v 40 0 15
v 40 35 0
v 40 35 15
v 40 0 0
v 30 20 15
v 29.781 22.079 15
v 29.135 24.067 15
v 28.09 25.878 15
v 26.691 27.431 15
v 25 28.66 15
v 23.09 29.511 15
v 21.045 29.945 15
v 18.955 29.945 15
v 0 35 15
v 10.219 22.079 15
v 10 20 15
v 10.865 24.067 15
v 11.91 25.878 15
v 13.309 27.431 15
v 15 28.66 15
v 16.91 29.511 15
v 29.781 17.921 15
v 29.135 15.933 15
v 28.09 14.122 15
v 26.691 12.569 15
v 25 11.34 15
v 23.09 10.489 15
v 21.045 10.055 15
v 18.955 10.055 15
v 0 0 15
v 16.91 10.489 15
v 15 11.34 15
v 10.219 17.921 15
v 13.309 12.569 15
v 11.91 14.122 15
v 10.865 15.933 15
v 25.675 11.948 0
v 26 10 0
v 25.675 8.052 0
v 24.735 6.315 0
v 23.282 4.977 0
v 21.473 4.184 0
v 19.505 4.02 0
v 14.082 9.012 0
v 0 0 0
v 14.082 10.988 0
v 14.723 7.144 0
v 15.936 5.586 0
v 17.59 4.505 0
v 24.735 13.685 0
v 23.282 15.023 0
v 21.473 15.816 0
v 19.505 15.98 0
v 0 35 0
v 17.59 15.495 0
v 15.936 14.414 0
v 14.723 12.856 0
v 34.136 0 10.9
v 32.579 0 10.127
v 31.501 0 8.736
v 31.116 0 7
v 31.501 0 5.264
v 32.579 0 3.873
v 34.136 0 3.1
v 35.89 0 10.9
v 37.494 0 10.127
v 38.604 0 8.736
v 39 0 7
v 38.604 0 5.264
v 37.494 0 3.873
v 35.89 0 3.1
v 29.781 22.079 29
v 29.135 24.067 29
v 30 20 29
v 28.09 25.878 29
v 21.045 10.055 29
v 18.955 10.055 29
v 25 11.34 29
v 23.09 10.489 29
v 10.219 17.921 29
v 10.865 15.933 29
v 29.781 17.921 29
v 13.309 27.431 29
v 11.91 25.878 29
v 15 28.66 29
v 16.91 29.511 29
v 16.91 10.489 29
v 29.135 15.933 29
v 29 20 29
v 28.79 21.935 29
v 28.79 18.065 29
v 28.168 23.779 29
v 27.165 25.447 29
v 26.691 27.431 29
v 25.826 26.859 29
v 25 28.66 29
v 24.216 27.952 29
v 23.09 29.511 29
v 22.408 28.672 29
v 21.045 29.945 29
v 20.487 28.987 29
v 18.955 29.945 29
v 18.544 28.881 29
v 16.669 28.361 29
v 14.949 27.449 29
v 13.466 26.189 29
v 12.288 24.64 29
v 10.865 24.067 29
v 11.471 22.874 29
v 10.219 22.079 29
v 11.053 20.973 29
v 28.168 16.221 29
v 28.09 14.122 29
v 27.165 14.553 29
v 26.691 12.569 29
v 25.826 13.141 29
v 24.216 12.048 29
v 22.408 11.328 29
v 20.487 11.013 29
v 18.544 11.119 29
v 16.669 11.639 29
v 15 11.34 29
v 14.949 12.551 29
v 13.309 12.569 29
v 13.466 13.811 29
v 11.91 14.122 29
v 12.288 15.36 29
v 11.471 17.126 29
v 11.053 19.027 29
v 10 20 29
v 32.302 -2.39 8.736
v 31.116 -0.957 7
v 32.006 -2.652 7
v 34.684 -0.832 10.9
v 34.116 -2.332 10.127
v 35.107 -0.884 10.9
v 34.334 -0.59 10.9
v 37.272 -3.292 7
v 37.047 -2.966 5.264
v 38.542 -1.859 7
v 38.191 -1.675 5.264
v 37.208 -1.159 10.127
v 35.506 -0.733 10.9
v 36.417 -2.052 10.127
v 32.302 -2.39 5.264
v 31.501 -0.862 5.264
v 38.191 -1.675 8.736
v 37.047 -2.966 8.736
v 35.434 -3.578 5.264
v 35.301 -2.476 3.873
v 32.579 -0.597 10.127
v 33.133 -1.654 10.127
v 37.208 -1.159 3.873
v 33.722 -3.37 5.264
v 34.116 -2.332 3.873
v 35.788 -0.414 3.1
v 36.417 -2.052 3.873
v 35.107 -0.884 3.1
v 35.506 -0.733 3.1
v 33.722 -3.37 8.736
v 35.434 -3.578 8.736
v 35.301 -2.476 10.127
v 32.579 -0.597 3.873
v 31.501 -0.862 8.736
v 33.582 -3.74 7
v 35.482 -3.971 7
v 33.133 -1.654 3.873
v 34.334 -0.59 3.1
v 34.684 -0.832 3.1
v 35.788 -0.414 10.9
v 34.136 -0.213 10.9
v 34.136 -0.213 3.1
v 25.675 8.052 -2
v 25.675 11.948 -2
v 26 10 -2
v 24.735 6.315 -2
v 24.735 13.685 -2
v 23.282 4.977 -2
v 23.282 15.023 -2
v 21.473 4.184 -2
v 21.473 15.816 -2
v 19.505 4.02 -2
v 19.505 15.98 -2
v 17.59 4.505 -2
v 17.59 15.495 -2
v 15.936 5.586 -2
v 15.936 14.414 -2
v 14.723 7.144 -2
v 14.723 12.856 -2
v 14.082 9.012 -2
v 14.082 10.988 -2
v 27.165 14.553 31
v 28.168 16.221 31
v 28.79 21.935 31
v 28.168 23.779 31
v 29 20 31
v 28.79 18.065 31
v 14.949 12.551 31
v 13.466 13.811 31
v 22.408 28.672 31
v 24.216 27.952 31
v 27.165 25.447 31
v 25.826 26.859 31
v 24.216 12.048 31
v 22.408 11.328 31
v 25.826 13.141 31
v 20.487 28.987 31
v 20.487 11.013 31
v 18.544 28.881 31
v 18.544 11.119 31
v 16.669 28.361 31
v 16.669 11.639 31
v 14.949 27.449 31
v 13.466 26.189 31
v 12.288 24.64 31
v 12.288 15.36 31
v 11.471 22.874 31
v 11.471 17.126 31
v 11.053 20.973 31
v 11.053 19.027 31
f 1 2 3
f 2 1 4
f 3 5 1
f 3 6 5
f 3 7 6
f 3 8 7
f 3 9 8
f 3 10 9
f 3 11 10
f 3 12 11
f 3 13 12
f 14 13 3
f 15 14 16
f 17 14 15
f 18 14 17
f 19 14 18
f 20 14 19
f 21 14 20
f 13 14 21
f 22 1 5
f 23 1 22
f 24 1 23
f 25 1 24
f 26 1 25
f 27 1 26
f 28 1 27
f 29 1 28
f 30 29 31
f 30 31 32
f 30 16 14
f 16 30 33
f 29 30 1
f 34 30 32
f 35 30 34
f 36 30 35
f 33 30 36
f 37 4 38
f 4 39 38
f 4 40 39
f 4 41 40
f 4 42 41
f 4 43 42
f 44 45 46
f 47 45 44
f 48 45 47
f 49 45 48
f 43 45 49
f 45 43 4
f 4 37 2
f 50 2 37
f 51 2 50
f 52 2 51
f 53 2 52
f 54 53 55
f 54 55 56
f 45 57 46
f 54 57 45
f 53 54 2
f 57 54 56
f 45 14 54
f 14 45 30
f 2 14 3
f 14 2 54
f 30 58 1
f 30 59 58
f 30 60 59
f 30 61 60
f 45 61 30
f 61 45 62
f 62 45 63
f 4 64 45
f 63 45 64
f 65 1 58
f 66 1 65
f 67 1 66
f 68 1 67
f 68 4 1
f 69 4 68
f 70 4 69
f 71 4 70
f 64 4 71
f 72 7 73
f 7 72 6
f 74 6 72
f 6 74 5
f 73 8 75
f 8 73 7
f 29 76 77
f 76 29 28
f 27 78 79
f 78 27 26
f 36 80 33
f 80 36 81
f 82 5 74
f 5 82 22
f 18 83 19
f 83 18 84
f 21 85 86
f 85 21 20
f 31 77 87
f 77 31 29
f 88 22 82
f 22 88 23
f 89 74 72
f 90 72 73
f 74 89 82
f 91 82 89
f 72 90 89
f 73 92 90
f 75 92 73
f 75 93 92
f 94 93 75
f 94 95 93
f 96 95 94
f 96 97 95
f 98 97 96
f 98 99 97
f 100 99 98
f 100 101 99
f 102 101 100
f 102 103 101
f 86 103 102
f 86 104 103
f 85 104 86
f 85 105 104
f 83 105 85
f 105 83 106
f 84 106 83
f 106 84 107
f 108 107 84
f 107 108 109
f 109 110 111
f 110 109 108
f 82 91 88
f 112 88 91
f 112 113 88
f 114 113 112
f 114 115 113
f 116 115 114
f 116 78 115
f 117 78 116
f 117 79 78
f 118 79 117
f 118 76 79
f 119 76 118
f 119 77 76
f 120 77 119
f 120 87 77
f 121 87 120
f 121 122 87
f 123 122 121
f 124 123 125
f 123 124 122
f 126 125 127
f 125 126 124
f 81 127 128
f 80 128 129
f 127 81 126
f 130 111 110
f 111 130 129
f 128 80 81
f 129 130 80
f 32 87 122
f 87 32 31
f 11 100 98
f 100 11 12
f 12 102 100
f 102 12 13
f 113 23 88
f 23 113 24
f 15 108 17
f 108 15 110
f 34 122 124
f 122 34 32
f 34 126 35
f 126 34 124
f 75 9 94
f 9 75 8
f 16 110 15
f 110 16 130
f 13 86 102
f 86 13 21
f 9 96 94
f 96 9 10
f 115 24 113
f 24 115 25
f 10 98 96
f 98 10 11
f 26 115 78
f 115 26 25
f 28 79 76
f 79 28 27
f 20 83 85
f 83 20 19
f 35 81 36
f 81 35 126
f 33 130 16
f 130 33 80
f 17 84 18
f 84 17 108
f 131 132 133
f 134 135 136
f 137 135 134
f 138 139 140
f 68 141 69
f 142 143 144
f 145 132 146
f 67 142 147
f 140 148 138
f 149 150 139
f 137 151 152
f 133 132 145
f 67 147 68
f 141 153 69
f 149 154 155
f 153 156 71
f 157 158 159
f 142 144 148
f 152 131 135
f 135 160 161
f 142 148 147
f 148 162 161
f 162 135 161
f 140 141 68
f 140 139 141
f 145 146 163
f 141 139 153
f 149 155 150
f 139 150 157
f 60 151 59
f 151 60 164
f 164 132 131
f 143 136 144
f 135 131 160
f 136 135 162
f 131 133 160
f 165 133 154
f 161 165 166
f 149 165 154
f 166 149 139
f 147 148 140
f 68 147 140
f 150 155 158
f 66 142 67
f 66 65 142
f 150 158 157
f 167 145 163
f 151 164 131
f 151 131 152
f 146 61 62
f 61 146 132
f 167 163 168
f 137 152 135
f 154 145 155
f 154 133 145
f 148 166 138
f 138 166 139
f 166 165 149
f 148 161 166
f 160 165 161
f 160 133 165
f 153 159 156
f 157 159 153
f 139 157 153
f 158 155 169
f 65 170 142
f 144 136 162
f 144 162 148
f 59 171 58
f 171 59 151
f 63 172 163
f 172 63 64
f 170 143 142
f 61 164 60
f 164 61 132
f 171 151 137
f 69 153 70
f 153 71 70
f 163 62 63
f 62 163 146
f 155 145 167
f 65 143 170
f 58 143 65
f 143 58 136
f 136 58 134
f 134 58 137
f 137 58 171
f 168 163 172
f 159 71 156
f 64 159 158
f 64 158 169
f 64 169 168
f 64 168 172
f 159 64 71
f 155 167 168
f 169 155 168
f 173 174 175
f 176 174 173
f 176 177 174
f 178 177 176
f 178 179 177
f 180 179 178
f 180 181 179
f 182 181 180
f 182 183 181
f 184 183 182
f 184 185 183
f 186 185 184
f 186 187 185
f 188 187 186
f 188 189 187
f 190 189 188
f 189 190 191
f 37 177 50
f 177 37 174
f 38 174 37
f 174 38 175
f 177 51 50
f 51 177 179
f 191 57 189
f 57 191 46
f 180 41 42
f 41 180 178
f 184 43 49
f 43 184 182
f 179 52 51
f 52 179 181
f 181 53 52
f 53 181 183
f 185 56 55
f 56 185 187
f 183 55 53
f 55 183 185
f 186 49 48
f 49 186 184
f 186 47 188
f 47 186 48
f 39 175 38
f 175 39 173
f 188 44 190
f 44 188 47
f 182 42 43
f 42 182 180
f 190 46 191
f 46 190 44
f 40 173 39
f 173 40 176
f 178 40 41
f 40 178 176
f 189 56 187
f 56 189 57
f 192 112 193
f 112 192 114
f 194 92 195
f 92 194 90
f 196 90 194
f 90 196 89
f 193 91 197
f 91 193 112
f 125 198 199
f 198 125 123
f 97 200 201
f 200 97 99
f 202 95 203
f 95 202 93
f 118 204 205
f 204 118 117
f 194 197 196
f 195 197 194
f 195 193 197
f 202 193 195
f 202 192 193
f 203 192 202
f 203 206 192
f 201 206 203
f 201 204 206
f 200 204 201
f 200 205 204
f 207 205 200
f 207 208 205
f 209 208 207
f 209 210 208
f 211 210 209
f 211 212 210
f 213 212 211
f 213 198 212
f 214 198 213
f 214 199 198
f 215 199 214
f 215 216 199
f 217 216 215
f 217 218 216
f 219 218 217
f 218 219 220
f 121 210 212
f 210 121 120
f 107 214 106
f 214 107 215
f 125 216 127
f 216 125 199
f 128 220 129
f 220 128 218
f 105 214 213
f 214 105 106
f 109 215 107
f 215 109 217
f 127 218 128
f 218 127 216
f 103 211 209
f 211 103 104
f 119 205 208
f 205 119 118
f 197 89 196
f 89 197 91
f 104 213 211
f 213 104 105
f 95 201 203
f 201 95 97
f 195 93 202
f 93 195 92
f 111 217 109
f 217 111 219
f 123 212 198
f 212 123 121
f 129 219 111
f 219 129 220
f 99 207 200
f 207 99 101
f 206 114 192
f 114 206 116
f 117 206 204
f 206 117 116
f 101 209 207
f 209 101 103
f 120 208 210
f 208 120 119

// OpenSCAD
cube([40,35,15]);
translate([20,20,15])cylinder(14,10,10);
translate([35,0,7])sphere(4);
translate([20,10,-2])cylinder(4,6,6);
translate([20,20,29])cylinder(2,9,9);
